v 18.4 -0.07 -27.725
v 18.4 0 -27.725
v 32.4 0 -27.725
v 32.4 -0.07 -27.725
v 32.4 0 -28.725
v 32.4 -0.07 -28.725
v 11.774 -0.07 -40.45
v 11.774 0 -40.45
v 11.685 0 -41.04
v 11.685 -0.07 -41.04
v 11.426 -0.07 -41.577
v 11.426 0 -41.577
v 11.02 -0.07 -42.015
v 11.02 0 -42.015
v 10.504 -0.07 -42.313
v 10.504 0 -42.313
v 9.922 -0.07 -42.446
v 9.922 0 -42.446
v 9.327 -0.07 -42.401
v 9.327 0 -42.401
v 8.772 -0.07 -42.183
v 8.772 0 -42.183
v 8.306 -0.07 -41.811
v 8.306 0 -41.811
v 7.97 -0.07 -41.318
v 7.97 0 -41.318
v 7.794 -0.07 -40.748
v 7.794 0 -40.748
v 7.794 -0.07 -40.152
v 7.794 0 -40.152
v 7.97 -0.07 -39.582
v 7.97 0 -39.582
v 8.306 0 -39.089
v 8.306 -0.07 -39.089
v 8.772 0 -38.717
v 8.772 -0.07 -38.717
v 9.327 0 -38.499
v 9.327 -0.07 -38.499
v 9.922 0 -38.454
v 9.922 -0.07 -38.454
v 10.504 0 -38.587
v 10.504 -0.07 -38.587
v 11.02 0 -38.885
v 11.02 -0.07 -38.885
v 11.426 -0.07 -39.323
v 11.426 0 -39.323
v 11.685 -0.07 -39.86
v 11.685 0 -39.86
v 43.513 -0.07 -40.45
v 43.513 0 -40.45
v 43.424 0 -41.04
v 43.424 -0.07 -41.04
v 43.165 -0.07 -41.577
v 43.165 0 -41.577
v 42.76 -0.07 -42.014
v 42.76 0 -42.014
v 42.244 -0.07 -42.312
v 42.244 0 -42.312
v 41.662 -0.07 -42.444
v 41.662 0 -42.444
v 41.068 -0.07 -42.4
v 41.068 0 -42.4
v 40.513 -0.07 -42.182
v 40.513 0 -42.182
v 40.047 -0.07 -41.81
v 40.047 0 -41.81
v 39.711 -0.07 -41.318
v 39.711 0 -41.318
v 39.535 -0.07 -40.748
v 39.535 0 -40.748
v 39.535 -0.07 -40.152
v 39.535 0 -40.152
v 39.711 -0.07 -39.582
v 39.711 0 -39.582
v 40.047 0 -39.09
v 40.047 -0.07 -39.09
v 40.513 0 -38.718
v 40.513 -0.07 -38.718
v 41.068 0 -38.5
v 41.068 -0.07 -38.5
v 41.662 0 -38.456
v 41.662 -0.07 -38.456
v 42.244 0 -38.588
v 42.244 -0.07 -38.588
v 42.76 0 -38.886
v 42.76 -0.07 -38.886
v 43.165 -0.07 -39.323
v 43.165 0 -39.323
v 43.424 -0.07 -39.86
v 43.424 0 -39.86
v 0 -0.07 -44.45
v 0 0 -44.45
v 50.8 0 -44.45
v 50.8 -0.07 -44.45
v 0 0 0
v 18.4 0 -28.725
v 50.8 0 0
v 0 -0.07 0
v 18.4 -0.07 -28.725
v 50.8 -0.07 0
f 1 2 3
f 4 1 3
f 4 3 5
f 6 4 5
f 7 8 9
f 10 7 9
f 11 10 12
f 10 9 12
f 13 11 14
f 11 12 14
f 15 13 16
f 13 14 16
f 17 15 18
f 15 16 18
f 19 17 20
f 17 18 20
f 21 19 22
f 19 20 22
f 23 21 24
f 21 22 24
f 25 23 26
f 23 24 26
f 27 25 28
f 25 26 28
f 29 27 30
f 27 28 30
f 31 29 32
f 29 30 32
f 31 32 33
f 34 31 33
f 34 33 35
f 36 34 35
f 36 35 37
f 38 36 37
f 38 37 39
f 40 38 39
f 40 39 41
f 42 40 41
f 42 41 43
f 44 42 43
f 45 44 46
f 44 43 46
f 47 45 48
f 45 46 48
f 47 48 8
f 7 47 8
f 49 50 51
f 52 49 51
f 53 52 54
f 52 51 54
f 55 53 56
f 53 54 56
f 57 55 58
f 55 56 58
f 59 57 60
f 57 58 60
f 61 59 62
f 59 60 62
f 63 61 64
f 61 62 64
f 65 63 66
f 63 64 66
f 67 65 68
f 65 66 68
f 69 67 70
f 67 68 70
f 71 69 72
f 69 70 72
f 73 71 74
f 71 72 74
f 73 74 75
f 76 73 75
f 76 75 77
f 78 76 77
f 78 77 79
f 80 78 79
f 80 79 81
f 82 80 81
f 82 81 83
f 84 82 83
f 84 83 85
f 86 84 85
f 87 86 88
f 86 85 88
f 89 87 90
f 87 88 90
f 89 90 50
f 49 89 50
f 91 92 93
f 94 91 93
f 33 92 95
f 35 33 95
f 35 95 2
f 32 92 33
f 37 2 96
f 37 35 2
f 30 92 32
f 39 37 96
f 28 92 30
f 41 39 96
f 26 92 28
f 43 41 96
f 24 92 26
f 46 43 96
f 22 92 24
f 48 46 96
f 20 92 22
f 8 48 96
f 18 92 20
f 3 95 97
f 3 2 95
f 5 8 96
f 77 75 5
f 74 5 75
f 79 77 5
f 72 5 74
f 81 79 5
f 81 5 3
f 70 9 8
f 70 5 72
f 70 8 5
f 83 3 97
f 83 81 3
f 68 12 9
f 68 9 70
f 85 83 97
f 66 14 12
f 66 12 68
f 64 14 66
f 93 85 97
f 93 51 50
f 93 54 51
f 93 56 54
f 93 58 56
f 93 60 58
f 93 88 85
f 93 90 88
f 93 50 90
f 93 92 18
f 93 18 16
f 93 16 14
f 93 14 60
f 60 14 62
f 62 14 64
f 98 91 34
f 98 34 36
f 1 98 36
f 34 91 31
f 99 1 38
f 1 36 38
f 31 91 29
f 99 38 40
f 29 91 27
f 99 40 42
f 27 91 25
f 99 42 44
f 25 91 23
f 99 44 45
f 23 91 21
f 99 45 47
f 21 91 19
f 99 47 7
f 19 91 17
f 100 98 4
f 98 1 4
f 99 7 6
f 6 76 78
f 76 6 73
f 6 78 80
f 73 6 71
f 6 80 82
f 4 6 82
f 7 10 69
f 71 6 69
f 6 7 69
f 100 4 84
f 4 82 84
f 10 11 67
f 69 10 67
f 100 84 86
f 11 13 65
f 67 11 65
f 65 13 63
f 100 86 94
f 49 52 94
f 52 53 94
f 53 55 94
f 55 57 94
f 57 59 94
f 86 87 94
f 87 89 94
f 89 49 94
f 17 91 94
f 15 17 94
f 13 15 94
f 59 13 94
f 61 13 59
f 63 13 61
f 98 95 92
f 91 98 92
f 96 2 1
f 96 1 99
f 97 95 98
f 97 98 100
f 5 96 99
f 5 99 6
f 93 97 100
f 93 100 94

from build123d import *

# Parameters (mm, degrees)
SKETCH2_W           = 50.8
SKETCH2_H           = 44.45
SKETCH2_R           = 2.001280135
SKETCH2_R_2         = 2
SKETCH2_W_2         = 14
SKETCH2_H_2         = 1
BOSS_EXTRUDE3_DEPTH = 0.07


with BuildPart() as part:
    # Sketch2 → Boss-Extrude3 (new body)
    with BuildSketch(Plane(origin=(0, 0, 0), x_dir=(1, 0, 0), z_dir=(0, 1, 0))):
        with Locations((25.4, 22.225)):
            Rectangle(SKETCH2_W, SKETCH2_H)
        with Locations((9.772683783, 40.45)):
            Circle(SKETCH2_R, mode=Mode.SUBTRACT)
        with Locations((41.512867403, 40.45)):
            Circle(SKETCH2_R_2, mode=Mode.SUBTRACT)
        with Locations((25.4, 28.225)):
            Rectangle(SKETCH2_W_2, SKETCH2_H_2, mode=Mode.SUBTRACT)
    extrude(amount=-BOSS_EXTRUDE3_DEPTH)


solid = part.part
